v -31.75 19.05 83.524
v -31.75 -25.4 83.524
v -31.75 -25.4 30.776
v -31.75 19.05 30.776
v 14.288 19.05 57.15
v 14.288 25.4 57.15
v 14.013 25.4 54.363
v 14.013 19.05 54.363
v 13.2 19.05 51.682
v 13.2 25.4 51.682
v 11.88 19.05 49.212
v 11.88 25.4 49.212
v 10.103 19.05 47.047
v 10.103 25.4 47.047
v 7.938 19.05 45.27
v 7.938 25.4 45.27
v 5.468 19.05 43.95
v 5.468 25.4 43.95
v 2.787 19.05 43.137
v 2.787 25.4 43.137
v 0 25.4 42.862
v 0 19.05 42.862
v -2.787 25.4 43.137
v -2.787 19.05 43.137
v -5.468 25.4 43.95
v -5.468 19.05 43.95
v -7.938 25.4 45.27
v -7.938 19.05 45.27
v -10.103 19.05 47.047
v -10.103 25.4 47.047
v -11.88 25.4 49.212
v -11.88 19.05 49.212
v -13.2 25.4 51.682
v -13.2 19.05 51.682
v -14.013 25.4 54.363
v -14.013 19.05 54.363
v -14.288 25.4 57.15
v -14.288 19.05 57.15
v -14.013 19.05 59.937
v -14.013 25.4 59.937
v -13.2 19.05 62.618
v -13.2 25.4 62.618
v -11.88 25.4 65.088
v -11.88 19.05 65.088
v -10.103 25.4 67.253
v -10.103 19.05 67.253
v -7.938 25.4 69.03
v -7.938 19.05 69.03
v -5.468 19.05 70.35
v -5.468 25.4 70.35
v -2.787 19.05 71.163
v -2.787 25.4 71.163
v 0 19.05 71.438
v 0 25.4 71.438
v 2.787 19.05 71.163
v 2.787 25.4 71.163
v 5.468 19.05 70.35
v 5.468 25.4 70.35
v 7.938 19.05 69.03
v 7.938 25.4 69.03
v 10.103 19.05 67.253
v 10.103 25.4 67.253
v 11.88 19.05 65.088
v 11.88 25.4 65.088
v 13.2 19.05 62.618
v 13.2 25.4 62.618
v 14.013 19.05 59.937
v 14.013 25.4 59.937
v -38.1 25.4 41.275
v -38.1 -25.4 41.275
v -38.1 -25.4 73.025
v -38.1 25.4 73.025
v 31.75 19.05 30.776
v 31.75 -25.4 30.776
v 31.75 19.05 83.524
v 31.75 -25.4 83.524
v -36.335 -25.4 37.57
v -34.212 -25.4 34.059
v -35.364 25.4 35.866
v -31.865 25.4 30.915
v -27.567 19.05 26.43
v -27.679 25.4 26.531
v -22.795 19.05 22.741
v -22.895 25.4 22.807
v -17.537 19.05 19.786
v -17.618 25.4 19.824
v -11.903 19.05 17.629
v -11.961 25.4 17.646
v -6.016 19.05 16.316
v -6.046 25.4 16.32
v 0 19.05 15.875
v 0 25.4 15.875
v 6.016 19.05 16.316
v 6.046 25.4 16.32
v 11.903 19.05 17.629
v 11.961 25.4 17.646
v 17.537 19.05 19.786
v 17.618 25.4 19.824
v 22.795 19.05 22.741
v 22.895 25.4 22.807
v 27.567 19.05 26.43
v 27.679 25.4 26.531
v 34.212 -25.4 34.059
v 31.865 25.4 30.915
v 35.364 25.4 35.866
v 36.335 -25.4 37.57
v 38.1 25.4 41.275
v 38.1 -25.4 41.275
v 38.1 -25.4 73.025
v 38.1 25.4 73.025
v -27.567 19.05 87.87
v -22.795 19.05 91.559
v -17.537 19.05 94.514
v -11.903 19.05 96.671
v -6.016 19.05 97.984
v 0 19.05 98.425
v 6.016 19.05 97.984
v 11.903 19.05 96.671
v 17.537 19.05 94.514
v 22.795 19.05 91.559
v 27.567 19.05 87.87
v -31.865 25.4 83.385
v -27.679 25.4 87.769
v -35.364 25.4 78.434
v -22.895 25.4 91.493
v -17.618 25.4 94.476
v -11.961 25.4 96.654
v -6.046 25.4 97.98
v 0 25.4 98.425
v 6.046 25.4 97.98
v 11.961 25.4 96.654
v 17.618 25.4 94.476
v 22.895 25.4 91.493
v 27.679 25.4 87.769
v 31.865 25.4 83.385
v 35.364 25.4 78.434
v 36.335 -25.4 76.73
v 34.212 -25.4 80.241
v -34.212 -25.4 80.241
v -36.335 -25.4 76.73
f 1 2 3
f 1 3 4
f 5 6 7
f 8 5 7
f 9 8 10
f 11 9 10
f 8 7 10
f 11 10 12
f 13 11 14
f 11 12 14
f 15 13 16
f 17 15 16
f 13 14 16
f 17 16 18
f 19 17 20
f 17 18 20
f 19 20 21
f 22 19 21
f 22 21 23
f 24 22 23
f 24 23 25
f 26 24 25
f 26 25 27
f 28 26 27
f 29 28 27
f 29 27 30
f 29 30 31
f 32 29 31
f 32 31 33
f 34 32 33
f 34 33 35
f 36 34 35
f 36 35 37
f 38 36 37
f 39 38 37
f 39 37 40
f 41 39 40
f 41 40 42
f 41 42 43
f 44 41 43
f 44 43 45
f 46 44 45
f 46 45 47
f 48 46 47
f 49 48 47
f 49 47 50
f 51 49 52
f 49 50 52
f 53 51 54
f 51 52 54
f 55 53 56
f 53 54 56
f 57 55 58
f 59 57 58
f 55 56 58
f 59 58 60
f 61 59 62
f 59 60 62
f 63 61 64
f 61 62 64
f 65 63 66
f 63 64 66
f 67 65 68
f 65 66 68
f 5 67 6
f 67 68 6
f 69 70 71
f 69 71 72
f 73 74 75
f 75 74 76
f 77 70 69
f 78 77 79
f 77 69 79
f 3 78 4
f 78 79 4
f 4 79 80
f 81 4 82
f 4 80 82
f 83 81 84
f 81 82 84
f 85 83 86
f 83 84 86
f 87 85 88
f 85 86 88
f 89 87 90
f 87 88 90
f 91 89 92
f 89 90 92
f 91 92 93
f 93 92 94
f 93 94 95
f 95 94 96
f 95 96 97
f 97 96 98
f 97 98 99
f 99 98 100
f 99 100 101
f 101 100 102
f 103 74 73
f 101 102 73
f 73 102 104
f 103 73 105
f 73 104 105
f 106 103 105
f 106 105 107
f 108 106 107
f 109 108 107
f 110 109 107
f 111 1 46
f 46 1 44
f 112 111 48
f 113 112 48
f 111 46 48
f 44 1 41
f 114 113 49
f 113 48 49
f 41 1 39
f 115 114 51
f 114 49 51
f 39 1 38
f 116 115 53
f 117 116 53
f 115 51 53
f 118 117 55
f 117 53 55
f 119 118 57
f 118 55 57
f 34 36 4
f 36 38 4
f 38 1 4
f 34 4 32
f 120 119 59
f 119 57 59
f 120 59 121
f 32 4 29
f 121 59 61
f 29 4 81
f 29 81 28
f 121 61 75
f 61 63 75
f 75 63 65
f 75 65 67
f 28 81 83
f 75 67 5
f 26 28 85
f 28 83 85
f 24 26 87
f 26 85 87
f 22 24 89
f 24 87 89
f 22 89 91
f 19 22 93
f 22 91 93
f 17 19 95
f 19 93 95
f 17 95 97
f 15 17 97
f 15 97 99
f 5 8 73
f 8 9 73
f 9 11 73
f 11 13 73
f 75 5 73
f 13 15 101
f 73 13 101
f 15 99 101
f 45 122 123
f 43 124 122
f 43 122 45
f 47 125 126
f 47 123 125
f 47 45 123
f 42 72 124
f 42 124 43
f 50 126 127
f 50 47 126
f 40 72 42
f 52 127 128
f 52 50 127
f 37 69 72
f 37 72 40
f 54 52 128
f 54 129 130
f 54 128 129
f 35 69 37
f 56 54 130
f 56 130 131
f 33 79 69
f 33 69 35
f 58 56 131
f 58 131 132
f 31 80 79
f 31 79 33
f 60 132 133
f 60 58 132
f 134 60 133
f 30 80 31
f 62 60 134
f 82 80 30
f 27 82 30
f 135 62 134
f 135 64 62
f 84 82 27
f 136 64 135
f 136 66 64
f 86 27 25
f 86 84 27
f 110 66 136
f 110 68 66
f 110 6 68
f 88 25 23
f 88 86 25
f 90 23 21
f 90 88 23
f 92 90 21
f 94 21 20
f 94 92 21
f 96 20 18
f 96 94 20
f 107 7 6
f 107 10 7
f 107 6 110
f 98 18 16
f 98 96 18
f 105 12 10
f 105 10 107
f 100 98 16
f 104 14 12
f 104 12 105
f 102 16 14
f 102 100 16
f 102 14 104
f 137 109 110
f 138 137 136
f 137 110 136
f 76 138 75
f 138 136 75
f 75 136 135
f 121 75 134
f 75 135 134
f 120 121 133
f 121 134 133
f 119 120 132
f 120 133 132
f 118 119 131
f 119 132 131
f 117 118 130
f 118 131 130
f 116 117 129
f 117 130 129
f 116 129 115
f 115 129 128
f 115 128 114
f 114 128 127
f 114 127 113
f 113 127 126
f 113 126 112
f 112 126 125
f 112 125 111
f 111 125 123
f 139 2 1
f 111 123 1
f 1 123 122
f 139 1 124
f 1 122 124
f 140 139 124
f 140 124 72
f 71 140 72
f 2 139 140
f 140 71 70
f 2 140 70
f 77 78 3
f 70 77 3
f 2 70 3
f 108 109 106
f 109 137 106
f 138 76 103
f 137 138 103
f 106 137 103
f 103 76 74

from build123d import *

# Parameters (mm, degrees)
SKETCH1_W           = 76.2
SKETCH1_H           = 50.8
SKETCH1_W_2         = 63.5
SKETCH1_H_2         = 38.1
BOSS_EXTRUDE1_DEPTH = 114.3
SKETCH2_R           = 14.2875
CUT_EXTRUDE2_DEPTH  = 114.3
SKETCH3_W           = 63.5
SKETCH3_H           = 101.6
CUT_EXTRUDE3_DEPTH  = 7.62


with BuildPart() as part:
    # Sketch1 → Boss-Extrude1 (new body)
    with BuildSketch(Plane.XY):
        Rectangle(SKETCH1_W, SKETCH1_H)
        Rectangle(SKETCH1_W_2, SKETCH1_H_2, mode=Mode.SUBTRACT)
    extrude(amount=BOSS_EXTRUDE1_DEPTH)

    # Sketch2 → Cut-Extrude2 (cut)
    with BuildSketch(Plane(origin=(0, 25.4, 0), x_dir=(1, 0, 0), z_dir=(0, 1, 0))):
        with BuildLine():
            Line((38.1, -114.3), (38.1, -73.025))
            ThreePointArc((38.1, -73.025), (0, -98.425), (-38.1, -73.025))
            Line((-38.1, -73.025), (-38.1, -114.3))
            Line((-38.1, -114.3), (38.1, -114.3))
        make_face()
        with Locations((0, -57.15)):
            Circle(SKETCH2_R)
        with BuildLine():
            ThreePointArc((-38.1, -41.275), (0, -15.875), (38.1, -41.275))
            Line((38.1, -41.275), (38.1, 0))
            Line((38.1, 0), (-38.1, 0))
            Line((-38.1, 0), (-38.1, -41.275))
        make_face()
    extrude(amount=-CUT_EXTRUDE2_DEPTH, mode=Mode.SUBTRACT)

    # Sketch3 → Cut-Extrude3 (cut)
    with BuildSketch(Plane.XZ.offset(25.4)):
        with Locations((0, 57.15)):
            Rectangle(SKETCH3_W, SKETCH3_H)
    extrude(amount=-CUT_EXTRUDE3_DEPTH, mode=Mode.SUBTRACT)


solid = part.part
